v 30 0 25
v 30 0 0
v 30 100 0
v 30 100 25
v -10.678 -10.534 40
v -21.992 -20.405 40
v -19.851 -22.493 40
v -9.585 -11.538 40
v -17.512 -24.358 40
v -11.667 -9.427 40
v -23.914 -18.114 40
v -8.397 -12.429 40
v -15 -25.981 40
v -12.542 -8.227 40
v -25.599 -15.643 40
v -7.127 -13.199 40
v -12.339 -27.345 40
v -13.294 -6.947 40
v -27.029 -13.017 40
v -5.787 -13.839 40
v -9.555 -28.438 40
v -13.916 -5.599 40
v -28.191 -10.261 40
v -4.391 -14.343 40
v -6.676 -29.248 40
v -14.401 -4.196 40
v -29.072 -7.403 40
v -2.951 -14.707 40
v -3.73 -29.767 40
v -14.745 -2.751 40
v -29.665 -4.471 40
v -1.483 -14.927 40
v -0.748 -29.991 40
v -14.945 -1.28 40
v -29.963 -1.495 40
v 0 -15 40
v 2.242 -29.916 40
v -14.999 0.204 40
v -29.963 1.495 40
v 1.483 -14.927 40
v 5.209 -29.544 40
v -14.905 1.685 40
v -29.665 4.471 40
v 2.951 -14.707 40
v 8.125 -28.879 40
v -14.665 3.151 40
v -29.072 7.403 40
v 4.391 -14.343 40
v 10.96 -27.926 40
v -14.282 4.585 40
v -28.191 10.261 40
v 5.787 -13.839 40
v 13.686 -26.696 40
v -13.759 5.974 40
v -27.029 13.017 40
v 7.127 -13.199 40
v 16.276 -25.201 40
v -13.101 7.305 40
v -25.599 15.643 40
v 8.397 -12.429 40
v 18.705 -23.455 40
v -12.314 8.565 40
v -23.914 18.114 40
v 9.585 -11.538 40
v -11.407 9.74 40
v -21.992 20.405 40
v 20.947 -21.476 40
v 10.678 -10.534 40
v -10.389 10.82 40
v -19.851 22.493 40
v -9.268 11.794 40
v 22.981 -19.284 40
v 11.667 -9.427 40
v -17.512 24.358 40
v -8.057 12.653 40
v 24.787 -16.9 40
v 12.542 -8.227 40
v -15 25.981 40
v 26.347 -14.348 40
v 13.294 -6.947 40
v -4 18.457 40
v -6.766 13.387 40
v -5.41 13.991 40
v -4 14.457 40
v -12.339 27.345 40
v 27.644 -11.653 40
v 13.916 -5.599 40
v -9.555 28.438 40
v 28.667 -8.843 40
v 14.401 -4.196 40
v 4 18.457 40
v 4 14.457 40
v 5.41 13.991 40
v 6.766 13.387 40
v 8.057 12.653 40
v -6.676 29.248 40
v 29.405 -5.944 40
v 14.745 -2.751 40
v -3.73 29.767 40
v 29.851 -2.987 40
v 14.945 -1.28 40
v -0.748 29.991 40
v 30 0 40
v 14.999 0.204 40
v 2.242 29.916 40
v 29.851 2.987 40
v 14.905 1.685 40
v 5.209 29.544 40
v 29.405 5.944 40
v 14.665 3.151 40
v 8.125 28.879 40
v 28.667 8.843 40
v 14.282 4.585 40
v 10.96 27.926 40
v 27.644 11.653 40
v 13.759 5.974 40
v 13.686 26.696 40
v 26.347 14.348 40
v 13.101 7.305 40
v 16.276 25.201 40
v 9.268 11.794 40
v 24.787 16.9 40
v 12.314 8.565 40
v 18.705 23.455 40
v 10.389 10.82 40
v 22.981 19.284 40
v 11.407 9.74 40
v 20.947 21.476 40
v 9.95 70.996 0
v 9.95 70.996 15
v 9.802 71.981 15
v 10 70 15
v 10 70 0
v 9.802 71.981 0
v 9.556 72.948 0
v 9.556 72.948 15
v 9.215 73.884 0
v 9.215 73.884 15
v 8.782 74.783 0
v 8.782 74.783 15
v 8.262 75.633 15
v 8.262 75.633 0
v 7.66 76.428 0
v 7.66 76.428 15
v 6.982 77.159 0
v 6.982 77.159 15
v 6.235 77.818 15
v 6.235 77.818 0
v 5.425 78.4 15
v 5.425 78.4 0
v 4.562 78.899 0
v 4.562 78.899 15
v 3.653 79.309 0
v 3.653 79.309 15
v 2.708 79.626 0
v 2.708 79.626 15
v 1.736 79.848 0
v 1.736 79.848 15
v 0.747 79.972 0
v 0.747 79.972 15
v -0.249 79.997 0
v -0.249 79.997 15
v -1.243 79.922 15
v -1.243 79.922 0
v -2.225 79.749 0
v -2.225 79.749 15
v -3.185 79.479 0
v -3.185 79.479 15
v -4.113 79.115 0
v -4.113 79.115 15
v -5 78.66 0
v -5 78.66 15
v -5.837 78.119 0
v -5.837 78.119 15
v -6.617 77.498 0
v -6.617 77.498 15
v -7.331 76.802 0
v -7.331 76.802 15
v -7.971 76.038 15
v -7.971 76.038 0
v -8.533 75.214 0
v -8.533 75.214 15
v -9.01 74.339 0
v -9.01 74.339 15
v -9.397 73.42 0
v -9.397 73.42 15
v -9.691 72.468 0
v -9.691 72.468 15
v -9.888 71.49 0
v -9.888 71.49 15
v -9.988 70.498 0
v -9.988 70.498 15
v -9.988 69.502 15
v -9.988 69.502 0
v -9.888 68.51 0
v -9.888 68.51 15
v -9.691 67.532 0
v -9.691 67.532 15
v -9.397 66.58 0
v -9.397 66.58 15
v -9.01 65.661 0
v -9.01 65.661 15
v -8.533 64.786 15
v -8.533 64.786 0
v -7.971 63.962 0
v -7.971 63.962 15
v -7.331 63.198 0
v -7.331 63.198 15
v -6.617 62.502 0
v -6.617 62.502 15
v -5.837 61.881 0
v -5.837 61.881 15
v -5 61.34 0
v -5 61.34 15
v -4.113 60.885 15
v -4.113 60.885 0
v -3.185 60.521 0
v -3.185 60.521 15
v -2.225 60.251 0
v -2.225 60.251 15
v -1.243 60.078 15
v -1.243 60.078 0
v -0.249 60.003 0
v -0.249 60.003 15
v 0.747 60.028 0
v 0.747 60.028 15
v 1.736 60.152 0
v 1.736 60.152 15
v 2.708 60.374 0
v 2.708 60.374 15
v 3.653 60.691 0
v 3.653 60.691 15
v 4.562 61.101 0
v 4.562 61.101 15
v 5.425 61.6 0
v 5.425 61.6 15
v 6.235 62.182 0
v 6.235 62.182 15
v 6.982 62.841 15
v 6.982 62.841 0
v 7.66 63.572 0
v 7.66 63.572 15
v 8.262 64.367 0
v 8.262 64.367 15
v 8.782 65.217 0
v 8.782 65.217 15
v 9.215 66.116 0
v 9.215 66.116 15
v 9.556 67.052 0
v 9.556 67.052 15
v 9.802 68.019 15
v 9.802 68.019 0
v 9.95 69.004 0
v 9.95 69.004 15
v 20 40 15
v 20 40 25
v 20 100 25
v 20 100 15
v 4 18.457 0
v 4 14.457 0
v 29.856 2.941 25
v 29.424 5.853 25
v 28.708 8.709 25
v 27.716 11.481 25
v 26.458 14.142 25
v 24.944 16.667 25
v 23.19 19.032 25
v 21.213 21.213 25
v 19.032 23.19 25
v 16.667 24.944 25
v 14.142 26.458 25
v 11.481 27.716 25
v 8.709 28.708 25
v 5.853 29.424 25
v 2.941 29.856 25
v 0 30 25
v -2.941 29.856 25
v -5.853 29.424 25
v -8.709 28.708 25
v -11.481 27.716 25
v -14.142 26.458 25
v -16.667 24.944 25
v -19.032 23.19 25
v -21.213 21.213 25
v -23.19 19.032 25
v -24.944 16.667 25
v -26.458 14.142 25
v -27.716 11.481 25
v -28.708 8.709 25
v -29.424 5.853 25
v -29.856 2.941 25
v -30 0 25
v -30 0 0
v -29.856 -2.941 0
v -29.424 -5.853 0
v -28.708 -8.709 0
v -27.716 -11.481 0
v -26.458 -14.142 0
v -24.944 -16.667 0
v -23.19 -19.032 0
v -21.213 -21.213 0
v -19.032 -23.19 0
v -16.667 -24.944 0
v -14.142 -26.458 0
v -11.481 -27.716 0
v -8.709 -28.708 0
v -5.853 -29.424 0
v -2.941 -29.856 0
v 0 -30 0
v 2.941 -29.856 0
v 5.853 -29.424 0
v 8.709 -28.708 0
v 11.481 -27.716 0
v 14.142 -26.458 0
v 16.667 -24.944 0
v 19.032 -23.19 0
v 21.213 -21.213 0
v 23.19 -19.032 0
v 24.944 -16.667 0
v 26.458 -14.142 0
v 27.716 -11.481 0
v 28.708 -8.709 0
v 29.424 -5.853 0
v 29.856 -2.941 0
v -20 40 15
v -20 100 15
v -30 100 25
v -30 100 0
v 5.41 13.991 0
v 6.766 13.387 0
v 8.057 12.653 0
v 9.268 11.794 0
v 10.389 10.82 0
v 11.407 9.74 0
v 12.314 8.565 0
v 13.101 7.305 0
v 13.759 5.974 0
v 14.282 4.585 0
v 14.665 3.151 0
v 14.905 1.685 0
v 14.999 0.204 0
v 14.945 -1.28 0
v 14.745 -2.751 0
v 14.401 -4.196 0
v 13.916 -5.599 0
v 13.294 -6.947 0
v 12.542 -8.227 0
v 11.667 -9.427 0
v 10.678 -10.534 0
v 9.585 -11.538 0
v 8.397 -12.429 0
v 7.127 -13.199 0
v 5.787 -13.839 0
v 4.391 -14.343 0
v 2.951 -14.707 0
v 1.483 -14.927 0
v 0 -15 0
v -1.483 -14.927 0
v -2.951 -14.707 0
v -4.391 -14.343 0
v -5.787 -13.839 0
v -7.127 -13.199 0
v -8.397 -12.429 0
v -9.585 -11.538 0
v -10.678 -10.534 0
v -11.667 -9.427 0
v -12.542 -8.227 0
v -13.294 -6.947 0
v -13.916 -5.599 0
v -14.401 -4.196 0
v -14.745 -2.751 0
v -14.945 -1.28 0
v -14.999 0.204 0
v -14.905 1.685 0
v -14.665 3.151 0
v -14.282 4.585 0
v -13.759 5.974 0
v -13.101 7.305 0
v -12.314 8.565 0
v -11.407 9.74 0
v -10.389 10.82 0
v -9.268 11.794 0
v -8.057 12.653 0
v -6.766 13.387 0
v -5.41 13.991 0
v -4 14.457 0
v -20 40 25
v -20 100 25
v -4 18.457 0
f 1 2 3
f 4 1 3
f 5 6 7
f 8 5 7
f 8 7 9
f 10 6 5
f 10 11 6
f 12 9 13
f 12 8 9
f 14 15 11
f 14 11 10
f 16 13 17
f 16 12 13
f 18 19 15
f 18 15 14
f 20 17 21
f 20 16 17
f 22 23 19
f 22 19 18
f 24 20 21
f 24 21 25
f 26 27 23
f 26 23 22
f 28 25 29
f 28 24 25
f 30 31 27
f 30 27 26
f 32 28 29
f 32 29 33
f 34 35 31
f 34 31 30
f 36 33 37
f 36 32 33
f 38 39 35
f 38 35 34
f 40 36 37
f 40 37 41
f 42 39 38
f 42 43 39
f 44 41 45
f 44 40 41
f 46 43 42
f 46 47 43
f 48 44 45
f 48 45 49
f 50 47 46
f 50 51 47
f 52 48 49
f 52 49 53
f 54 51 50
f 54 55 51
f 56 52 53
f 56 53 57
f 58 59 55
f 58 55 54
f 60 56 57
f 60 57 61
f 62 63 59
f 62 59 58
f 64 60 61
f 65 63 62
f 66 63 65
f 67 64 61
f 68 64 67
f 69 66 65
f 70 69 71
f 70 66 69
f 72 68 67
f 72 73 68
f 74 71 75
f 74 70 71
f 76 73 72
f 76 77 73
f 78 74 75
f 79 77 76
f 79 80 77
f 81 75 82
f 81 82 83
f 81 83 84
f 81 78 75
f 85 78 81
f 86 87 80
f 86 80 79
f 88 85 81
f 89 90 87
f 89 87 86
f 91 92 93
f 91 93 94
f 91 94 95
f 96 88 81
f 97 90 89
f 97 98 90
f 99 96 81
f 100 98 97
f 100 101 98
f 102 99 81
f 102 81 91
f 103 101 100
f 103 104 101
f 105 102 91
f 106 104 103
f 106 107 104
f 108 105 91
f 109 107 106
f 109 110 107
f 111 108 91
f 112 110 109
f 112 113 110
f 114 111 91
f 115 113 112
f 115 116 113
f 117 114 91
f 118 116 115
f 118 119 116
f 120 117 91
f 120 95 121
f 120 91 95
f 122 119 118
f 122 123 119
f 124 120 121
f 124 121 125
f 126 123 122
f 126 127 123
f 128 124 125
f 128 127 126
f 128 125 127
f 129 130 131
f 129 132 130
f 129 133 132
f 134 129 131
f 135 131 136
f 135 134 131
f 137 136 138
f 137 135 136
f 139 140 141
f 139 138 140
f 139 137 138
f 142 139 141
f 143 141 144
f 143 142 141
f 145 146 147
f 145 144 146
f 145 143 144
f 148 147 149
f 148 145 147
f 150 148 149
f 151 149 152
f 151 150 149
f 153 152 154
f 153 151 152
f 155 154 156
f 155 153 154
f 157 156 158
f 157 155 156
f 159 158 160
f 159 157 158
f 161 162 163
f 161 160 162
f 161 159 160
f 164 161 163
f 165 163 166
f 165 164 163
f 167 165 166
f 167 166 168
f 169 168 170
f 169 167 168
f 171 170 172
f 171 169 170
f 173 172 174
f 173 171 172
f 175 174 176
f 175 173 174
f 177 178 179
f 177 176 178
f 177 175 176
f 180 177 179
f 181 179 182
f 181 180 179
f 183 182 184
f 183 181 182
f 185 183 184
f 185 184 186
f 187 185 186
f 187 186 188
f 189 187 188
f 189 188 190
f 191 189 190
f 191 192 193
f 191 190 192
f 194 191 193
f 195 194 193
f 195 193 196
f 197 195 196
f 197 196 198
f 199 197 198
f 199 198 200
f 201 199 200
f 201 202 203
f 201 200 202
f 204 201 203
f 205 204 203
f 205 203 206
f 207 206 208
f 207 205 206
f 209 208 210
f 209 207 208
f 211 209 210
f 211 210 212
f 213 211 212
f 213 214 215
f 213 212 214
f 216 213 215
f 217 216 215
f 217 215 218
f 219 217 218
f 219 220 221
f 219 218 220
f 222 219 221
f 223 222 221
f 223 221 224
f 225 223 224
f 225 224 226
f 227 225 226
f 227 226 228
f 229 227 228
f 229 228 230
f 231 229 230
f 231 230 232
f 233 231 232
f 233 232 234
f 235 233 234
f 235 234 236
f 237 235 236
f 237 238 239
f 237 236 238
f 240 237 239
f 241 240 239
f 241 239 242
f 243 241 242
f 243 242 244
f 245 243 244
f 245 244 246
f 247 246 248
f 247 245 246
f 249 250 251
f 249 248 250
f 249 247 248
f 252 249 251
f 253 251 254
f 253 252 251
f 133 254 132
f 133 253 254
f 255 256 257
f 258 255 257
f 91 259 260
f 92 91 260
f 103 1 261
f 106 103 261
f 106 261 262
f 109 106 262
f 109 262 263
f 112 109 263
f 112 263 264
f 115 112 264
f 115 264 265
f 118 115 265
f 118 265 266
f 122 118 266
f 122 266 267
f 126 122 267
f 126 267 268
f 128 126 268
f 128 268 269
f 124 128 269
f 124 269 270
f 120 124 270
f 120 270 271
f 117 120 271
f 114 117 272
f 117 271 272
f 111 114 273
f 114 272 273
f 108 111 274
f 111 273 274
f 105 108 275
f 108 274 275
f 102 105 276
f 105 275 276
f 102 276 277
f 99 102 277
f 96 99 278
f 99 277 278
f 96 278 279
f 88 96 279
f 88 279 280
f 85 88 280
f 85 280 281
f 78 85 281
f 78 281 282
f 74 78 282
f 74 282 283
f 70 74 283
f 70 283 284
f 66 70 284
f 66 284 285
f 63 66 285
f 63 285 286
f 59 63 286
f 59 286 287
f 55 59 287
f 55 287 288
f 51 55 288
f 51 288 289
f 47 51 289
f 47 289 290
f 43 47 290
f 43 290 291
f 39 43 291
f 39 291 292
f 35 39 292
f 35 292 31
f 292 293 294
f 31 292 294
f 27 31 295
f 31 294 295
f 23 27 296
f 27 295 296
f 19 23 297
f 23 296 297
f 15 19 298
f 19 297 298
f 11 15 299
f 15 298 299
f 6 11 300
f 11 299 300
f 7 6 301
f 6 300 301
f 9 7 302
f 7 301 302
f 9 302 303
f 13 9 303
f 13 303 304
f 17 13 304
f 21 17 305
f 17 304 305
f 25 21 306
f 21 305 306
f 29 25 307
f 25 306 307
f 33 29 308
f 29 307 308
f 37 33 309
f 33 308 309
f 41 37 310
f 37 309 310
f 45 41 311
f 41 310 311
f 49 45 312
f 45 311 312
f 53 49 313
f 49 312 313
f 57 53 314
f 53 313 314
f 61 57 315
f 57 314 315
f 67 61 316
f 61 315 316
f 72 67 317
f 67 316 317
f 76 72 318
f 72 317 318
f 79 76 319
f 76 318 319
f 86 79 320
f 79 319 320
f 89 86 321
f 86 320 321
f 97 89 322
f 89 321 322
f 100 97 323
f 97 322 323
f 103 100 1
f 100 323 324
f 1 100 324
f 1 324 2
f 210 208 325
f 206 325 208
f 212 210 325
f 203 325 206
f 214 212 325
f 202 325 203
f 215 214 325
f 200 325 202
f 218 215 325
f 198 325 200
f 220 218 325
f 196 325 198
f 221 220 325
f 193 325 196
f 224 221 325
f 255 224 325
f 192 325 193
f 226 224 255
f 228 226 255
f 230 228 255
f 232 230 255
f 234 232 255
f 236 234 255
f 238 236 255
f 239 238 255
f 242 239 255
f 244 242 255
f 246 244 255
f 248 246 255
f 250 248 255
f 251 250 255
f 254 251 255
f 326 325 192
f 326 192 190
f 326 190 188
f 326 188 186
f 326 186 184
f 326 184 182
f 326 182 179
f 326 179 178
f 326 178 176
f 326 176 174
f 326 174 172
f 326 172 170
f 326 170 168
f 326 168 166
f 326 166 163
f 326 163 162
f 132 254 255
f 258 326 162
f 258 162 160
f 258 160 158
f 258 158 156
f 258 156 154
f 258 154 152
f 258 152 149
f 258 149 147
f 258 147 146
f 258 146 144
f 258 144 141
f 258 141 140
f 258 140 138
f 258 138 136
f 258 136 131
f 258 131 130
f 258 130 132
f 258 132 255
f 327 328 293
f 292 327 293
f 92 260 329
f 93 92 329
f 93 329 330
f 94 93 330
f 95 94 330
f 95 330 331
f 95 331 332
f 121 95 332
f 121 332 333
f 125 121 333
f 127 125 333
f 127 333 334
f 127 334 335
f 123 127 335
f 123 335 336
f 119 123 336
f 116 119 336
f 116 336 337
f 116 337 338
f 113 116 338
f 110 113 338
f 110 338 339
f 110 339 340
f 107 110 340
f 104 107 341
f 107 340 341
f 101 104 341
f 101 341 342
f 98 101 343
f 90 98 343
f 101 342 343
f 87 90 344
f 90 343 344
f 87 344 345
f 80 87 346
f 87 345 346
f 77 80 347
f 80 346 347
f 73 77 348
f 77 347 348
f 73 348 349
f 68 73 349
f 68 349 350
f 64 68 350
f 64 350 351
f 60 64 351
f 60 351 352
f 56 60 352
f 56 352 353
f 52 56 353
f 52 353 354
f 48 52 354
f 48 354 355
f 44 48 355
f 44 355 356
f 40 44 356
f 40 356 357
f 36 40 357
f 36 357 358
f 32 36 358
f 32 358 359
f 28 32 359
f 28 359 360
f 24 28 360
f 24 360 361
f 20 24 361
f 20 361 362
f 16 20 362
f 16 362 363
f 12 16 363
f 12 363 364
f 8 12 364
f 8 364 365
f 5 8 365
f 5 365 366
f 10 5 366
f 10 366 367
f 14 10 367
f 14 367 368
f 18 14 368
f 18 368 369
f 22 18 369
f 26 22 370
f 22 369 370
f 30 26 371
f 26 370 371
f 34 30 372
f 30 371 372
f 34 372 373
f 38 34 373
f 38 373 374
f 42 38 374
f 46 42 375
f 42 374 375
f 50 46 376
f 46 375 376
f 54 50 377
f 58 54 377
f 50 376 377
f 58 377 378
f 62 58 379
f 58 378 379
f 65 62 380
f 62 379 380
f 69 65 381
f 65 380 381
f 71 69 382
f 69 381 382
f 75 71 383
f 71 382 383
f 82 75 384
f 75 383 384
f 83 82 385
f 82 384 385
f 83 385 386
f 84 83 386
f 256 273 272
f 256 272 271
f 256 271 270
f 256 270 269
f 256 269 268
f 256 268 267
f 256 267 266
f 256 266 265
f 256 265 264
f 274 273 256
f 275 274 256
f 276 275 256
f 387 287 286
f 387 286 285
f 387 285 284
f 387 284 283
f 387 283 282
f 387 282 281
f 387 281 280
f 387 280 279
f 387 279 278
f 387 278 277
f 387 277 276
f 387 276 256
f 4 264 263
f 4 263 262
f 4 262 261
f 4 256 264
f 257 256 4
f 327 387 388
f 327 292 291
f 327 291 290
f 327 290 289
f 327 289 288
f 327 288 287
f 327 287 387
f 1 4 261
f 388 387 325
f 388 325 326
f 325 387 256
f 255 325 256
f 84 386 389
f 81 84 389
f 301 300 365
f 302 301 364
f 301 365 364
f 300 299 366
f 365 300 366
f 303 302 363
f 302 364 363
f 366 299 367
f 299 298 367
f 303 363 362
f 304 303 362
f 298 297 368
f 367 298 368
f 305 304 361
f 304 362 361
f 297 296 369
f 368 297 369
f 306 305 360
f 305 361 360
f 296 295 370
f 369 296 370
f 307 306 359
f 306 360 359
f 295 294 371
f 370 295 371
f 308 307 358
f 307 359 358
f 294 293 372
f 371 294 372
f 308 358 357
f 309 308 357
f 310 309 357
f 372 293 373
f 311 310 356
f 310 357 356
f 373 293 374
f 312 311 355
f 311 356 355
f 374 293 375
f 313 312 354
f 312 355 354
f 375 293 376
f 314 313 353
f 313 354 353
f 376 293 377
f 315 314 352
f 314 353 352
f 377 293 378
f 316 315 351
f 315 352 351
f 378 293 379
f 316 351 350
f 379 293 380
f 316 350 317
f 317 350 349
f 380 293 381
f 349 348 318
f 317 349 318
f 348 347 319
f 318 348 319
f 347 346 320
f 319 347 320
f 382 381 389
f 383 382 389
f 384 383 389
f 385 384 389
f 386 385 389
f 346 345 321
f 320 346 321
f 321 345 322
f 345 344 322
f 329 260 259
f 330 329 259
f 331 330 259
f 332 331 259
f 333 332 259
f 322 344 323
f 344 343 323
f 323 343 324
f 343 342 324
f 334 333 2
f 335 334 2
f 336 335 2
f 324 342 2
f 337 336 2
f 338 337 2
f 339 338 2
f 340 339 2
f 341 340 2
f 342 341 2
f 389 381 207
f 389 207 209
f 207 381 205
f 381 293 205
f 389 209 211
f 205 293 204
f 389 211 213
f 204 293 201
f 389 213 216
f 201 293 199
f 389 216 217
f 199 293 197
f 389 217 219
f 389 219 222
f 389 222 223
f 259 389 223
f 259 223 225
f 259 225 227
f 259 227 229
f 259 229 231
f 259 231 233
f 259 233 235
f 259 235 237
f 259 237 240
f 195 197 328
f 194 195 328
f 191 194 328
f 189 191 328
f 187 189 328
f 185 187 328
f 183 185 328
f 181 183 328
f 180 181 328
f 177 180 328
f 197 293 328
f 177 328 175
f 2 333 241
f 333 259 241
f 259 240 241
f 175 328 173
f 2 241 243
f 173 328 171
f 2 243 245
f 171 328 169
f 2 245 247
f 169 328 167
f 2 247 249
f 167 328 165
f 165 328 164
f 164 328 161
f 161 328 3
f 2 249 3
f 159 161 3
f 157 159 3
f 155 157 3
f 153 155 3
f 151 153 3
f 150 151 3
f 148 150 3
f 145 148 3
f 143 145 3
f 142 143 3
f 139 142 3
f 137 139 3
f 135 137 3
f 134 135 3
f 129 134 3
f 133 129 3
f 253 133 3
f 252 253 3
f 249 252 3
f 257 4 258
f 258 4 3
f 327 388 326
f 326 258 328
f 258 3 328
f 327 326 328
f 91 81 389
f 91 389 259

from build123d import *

# Parameters (mm, degrees)
BOSS_EXTRUDE1_DEPTH     = 25
BOSS_EXTRUDE2_DEPTH     = 40
SKETCH2_W               = 40
SKETCH2_H               = 60
CUT_EXTRUDE1_DEPTH      = 10
CUT_EXTRUDE2_DEPTH      = 108.354552768
CUT_EXTRUDE2_DEPTH_BACK = 108.354552768
SKETCH3_R               = 10
CUT_EXTRUDE3_DEPTH      = 112.803398875
CUT_EXTRUDE3_DEPTH_BACK = 112.803398875


with BuildPart() as part:
    # Sketch1 → Boss-Extrude1 (new body)
    with BuildSketch(Plane(origin=(0, 0, 0), x_dir=(0, 1, 0), z_dir=(0, 0, 1))):
        with BuildLine():
            Line((100, 30), (0, 30))
            ThreePointArc((0, 30), (21.213203436, 21.213203436), (30, 0))
            ThreePointArc((30, 0), (21.213203436, -21.213203436), (0, -30))
            Line((0, -30), (100, -30))
            Line((100, -30), (100, 30))
        make_face()
    extrude(amount=BOSS_EXTRUDE1_DEPTH)

    # Sketch1<3> → Boss-Extrude2 (add)
    with BuildSketch(Plane(origin=(0, 0, 0), x_dir=(0, 1, 0), z_dir=(0, 0, 1))):
        with BuildLine():
            ThreePointArc((30, 0), (21.213203436, 21.213203436), (0, 30))
            ThreePointArc((0, 30), (-30, 0), (0, -30))
            ThreePointArc((0, -30), (21.213203436, -21.213203436), (30, 0))
        make_face()
    extrude(amount=BOSS_EXTRUDE2_DEPTH)

    # Sketch2 → Cut-Extrude1 (cut)
    with BuildSketch(Plane.XY.offset(25)):
        with Locations((0, 70)):
            Rectangle(SKETCH2_W, SKETCH2_H)
    extrude(amount=-CUT_EXTRUDE1_DEPTH, mode=Mode.SUBTRACT)

    # Sketch3 → Cut-Extrude2 (cut, two sides: drawn at the far end of the back side and taken through both)
    with BuildSketch(Plane.XY.offset(15).offset(-CUT_EXTRUDE2_DEPTH_BACK)):
        with Locations((0, 70)):
            Circle(SKETCH3_R)
    extrude(amount=CUT_EXTRUDE2_DEPTH + CUT_EXTRUDE2_DEPTH_BACK, mode=Mode.SUBTRACT)

    # Sketch4 → Cut-Extrude3 (cut, two sides: drawn at the far end of the back side and taken through both)
    with BuildSketch(Plane.XY.offset(40).offset(-CUT_EXTRUDE3_DEPTH_BACK)):
        with BuildLine():
            Line((-4, 18.456832295), (4, 18.456832295))
            Line((4, 18.456832295), (4, 14.456832295))
            ThreePointArc((4, 14.456832295), (0, -15), (-4, 14.456832295))
            Line((-4, 14.456832295), (-4, 18.456832295))
        make_face()
    extrude(amount=CUT_EXTRUDE3_DEPTH + CUT_EXTRUDE3_DEPTH_BACK, mode=Mode.SUBTRACT)


solid = part.part
